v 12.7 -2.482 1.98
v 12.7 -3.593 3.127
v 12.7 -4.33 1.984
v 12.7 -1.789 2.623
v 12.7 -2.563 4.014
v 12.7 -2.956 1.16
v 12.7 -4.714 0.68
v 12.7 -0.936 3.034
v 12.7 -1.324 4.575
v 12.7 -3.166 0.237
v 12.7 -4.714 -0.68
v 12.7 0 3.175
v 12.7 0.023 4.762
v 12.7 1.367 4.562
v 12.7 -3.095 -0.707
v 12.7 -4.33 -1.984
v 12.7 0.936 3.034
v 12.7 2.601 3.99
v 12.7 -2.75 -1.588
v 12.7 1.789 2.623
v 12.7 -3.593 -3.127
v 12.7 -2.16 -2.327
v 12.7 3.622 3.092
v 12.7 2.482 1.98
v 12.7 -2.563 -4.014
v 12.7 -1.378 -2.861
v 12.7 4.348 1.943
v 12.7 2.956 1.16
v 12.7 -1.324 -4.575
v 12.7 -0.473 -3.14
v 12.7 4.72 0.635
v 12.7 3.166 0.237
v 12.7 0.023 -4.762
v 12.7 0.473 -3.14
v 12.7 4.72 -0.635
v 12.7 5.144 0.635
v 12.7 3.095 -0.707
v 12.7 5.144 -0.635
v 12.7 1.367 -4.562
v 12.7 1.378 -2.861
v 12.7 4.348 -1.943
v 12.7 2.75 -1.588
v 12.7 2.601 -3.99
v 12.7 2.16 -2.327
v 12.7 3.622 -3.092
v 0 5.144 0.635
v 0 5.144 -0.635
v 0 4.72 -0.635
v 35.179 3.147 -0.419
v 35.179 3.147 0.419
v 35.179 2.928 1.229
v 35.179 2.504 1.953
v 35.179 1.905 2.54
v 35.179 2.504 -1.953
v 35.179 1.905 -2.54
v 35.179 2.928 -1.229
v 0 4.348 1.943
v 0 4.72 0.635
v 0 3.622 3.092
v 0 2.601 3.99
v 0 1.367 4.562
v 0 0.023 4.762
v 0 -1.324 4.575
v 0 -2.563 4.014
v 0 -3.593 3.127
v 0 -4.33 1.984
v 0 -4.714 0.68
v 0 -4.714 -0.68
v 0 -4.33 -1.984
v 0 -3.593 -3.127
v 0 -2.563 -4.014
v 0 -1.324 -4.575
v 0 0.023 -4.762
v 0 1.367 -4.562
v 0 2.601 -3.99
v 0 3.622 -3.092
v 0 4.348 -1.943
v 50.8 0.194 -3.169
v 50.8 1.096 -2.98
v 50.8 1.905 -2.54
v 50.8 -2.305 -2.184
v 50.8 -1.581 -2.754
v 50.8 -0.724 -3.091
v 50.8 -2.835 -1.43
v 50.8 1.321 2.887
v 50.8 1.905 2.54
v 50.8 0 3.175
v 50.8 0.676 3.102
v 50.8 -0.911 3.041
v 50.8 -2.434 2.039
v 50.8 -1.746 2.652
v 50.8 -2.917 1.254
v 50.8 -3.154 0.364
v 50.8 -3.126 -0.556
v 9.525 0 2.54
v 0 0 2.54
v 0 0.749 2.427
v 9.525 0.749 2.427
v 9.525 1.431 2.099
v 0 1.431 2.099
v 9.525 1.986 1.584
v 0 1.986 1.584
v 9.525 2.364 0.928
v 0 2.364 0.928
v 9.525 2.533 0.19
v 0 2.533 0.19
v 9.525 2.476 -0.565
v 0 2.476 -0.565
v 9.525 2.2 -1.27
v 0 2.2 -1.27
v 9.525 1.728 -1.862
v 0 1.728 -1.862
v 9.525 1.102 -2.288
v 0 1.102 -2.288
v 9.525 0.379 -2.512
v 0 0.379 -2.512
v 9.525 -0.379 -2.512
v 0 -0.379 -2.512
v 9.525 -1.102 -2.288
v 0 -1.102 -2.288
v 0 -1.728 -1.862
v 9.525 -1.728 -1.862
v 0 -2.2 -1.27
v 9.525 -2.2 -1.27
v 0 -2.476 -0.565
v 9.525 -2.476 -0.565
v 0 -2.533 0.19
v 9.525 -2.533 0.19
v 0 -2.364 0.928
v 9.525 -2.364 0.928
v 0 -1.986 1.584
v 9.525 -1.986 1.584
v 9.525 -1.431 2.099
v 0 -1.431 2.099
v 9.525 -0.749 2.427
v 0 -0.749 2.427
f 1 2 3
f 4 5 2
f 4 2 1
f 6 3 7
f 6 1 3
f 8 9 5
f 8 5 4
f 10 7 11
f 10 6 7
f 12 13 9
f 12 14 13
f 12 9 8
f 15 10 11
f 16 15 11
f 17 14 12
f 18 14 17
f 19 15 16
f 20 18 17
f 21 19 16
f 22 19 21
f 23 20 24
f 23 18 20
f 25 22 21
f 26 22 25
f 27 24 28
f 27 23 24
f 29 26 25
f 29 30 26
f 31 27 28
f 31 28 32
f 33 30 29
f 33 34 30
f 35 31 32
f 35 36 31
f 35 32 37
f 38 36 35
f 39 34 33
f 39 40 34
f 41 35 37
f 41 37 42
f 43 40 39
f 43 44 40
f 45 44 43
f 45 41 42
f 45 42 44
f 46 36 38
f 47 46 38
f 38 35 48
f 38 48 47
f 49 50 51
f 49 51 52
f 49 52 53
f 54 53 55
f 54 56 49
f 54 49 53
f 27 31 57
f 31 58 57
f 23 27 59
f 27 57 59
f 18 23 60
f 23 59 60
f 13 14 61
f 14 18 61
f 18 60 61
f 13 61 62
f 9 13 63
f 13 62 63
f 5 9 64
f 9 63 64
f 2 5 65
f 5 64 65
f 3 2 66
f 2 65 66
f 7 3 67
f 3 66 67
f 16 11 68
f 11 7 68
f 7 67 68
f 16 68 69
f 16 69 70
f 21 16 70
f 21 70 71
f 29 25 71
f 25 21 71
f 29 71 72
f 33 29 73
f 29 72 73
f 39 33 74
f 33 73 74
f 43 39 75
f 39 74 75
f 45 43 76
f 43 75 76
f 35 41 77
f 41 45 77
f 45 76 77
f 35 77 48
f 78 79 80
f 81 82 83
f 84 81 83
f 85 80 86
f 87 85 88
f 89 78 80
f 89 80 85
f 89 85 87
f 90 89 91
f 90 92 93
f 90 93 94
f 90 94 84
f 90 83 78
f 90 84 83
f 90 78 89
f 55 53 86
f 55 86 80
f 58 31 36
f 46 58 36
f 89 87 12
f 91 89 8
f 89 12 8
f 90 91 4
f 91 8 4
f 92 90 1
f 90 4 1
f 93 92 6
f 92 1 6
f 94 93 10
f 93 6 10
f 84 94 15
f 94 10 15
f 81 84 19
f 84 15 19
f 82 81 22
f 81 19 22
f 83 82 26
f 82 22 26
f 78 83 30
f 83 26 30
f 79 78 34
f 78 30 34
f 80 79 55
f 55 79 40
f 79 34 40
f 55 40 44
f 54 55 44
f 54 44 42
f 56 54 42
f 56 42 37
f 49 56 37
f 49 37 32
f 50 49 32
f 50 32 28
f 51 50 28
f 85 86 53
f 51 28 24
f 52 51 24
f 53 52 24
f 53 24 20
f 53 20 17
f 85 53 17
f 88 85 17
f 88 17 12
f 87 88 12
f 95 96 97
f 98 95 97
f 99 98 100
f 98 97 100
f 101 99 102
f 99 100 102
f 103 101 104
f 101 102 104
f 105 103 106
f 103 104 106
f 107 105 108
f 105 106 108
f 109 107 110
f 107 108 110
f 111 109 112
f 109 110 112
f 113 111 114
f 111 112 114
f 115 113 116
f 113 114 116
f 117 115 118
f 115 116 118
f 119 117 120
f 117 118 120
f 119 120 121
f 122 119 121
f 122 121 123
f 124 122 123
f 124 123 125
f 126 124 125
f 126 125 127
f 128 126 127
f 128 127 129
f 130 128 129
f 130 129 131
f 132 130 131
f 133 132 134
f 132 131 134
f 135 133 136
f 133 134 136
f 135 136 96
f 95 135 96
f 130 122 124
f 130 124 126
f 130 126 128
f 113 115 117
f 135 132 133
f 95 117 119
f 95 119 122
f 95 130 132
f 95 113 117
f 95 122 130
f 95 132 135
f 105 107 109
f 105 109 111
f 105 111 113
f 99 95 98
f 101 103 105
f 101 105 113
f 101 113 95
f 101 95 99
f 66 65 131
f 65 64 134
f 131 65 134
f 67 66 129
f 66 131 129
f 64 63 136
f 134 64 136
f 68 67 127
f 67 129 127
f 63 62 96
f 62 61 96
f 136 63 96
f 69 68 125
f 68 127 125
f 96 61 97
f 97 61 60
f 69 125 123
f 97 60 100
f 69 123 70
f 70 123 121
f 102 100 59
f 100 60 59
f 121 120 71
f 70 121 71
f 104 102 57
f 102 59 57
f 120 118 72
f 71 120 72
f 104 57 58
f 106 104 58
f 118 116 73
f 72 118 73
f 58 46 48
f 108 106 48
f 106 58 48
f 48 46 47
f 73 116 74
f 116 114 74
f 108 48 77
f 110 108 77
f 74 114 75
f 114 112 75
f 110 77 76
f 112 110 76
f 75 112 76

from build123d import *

# Parameters (mm, degrees)
SKETCH1_R           = 4.7625
SKETCH1_R_2         = 2.54
SKETCH1_R_3         = 1.5875
BOSS_EXTRUDE1_DEPTH = 12.7
SKETCH2_R           = 2.54
CUT_EXTRUDE1_DEPTH  = 9.525
SKETCH3_R           = 3.175
BOSS_EXTRUDE2_DEPTH = 38.1
SKETCH4_W           = 1.27
SKETCH4_H           = 0.762
BOSS_EXTRUDE3_DEPTH = 12.7
CUT_EXTRUDE2_START  = -15.621
CUT_EXTRUDE2_DEPTH  = 15.621


with BuildPart() as part:
    # Sketch1 → Boss-Extrude1 (new body)
    # profile 1 of 3: a face of its own
    with BuildSketch(Plane(origin=(0, 0, 0), x_dir=(0, 0, -1), z_dir=(1, 0, 0))):
        Circle(SKETCH1_R)
        Circle(SKETCH1_R_2, mode=Mode.SUBTRACT)
    # profile 2 of 3: a face of its own
    with BuildSketch(Plane(origin=(0, 0, 0), x_dir=(0, 0, -1), z_dir=(1, 0, 0))):
        Circle(SKETCH1_R_2)
        Circle(SKETCH1_R_3, mode=Mode.SUBTRACT)
    # profile 3 of 3: a face of its own
    with BuildSketch(Plane(origin=(0, 0, 0), x_dir=(0, 0, -1), z_dir=(1, 0, 0))):
        Circle(SKETCH1_R_3)
    extrude(amount=BOSS_EXTRUDE1_DEPTH)

    # Sketch2 → Cut-Extrude1 (cut)
    with BuildSketch(Plane.ZY):
        Circle(SKETCH2_R)
    extrude(amount=-CUT_EXTRUDE1_DEPTH, mode=Mode.SUBTRACT)

    # Sketch3 → Boss-Extrude2 (add)
    with BuildSketch(Plane(origin=(12.7, 0, 0), x_dir=(0, 0, -1), z_dir=(1, 0, 0))):
        with Locations(Location((0, 0, 0), (0, 0, 180))):
            Circle(SKETCH3_R)
    extrude(amount=BOSS_EXTRUDE2_DEPTH)

    # Sketch4 → Boss-Extrude3 (add)
    with BuildSketch(Plane(origin=(12.7, 0, 0), x_dir=(0, 0, -1), z_dir=(1, 0, 0))):
        with Locations((0, 4.7625)):
            Rectangle(SKETCH4_W, SKETCH4_H)
    extrude(amount=-BOSS_EXTRUDE3_DEPTH)

    # Sketch5 → Cut-Extrude2 (cut)
    with BuildSketch(Plane(origin=(50.8, 0, 0), x_dir=(0, 0, -1), z_dir=(1, 0, 0)).offset(CUT_EXTRUDE2_START)):
        with BuildLine():
            Line((-2.54, 1.905), (2.54, 1.905))
            ThreePointArc((2.54, 1.905), (0, 3.175), (-2.54, 1.905))
        make_face()
    extrude(amount=CUT_EXTRUDE2_DEPTH, mode=Mode.SUBTRACT)


solid = part.part
